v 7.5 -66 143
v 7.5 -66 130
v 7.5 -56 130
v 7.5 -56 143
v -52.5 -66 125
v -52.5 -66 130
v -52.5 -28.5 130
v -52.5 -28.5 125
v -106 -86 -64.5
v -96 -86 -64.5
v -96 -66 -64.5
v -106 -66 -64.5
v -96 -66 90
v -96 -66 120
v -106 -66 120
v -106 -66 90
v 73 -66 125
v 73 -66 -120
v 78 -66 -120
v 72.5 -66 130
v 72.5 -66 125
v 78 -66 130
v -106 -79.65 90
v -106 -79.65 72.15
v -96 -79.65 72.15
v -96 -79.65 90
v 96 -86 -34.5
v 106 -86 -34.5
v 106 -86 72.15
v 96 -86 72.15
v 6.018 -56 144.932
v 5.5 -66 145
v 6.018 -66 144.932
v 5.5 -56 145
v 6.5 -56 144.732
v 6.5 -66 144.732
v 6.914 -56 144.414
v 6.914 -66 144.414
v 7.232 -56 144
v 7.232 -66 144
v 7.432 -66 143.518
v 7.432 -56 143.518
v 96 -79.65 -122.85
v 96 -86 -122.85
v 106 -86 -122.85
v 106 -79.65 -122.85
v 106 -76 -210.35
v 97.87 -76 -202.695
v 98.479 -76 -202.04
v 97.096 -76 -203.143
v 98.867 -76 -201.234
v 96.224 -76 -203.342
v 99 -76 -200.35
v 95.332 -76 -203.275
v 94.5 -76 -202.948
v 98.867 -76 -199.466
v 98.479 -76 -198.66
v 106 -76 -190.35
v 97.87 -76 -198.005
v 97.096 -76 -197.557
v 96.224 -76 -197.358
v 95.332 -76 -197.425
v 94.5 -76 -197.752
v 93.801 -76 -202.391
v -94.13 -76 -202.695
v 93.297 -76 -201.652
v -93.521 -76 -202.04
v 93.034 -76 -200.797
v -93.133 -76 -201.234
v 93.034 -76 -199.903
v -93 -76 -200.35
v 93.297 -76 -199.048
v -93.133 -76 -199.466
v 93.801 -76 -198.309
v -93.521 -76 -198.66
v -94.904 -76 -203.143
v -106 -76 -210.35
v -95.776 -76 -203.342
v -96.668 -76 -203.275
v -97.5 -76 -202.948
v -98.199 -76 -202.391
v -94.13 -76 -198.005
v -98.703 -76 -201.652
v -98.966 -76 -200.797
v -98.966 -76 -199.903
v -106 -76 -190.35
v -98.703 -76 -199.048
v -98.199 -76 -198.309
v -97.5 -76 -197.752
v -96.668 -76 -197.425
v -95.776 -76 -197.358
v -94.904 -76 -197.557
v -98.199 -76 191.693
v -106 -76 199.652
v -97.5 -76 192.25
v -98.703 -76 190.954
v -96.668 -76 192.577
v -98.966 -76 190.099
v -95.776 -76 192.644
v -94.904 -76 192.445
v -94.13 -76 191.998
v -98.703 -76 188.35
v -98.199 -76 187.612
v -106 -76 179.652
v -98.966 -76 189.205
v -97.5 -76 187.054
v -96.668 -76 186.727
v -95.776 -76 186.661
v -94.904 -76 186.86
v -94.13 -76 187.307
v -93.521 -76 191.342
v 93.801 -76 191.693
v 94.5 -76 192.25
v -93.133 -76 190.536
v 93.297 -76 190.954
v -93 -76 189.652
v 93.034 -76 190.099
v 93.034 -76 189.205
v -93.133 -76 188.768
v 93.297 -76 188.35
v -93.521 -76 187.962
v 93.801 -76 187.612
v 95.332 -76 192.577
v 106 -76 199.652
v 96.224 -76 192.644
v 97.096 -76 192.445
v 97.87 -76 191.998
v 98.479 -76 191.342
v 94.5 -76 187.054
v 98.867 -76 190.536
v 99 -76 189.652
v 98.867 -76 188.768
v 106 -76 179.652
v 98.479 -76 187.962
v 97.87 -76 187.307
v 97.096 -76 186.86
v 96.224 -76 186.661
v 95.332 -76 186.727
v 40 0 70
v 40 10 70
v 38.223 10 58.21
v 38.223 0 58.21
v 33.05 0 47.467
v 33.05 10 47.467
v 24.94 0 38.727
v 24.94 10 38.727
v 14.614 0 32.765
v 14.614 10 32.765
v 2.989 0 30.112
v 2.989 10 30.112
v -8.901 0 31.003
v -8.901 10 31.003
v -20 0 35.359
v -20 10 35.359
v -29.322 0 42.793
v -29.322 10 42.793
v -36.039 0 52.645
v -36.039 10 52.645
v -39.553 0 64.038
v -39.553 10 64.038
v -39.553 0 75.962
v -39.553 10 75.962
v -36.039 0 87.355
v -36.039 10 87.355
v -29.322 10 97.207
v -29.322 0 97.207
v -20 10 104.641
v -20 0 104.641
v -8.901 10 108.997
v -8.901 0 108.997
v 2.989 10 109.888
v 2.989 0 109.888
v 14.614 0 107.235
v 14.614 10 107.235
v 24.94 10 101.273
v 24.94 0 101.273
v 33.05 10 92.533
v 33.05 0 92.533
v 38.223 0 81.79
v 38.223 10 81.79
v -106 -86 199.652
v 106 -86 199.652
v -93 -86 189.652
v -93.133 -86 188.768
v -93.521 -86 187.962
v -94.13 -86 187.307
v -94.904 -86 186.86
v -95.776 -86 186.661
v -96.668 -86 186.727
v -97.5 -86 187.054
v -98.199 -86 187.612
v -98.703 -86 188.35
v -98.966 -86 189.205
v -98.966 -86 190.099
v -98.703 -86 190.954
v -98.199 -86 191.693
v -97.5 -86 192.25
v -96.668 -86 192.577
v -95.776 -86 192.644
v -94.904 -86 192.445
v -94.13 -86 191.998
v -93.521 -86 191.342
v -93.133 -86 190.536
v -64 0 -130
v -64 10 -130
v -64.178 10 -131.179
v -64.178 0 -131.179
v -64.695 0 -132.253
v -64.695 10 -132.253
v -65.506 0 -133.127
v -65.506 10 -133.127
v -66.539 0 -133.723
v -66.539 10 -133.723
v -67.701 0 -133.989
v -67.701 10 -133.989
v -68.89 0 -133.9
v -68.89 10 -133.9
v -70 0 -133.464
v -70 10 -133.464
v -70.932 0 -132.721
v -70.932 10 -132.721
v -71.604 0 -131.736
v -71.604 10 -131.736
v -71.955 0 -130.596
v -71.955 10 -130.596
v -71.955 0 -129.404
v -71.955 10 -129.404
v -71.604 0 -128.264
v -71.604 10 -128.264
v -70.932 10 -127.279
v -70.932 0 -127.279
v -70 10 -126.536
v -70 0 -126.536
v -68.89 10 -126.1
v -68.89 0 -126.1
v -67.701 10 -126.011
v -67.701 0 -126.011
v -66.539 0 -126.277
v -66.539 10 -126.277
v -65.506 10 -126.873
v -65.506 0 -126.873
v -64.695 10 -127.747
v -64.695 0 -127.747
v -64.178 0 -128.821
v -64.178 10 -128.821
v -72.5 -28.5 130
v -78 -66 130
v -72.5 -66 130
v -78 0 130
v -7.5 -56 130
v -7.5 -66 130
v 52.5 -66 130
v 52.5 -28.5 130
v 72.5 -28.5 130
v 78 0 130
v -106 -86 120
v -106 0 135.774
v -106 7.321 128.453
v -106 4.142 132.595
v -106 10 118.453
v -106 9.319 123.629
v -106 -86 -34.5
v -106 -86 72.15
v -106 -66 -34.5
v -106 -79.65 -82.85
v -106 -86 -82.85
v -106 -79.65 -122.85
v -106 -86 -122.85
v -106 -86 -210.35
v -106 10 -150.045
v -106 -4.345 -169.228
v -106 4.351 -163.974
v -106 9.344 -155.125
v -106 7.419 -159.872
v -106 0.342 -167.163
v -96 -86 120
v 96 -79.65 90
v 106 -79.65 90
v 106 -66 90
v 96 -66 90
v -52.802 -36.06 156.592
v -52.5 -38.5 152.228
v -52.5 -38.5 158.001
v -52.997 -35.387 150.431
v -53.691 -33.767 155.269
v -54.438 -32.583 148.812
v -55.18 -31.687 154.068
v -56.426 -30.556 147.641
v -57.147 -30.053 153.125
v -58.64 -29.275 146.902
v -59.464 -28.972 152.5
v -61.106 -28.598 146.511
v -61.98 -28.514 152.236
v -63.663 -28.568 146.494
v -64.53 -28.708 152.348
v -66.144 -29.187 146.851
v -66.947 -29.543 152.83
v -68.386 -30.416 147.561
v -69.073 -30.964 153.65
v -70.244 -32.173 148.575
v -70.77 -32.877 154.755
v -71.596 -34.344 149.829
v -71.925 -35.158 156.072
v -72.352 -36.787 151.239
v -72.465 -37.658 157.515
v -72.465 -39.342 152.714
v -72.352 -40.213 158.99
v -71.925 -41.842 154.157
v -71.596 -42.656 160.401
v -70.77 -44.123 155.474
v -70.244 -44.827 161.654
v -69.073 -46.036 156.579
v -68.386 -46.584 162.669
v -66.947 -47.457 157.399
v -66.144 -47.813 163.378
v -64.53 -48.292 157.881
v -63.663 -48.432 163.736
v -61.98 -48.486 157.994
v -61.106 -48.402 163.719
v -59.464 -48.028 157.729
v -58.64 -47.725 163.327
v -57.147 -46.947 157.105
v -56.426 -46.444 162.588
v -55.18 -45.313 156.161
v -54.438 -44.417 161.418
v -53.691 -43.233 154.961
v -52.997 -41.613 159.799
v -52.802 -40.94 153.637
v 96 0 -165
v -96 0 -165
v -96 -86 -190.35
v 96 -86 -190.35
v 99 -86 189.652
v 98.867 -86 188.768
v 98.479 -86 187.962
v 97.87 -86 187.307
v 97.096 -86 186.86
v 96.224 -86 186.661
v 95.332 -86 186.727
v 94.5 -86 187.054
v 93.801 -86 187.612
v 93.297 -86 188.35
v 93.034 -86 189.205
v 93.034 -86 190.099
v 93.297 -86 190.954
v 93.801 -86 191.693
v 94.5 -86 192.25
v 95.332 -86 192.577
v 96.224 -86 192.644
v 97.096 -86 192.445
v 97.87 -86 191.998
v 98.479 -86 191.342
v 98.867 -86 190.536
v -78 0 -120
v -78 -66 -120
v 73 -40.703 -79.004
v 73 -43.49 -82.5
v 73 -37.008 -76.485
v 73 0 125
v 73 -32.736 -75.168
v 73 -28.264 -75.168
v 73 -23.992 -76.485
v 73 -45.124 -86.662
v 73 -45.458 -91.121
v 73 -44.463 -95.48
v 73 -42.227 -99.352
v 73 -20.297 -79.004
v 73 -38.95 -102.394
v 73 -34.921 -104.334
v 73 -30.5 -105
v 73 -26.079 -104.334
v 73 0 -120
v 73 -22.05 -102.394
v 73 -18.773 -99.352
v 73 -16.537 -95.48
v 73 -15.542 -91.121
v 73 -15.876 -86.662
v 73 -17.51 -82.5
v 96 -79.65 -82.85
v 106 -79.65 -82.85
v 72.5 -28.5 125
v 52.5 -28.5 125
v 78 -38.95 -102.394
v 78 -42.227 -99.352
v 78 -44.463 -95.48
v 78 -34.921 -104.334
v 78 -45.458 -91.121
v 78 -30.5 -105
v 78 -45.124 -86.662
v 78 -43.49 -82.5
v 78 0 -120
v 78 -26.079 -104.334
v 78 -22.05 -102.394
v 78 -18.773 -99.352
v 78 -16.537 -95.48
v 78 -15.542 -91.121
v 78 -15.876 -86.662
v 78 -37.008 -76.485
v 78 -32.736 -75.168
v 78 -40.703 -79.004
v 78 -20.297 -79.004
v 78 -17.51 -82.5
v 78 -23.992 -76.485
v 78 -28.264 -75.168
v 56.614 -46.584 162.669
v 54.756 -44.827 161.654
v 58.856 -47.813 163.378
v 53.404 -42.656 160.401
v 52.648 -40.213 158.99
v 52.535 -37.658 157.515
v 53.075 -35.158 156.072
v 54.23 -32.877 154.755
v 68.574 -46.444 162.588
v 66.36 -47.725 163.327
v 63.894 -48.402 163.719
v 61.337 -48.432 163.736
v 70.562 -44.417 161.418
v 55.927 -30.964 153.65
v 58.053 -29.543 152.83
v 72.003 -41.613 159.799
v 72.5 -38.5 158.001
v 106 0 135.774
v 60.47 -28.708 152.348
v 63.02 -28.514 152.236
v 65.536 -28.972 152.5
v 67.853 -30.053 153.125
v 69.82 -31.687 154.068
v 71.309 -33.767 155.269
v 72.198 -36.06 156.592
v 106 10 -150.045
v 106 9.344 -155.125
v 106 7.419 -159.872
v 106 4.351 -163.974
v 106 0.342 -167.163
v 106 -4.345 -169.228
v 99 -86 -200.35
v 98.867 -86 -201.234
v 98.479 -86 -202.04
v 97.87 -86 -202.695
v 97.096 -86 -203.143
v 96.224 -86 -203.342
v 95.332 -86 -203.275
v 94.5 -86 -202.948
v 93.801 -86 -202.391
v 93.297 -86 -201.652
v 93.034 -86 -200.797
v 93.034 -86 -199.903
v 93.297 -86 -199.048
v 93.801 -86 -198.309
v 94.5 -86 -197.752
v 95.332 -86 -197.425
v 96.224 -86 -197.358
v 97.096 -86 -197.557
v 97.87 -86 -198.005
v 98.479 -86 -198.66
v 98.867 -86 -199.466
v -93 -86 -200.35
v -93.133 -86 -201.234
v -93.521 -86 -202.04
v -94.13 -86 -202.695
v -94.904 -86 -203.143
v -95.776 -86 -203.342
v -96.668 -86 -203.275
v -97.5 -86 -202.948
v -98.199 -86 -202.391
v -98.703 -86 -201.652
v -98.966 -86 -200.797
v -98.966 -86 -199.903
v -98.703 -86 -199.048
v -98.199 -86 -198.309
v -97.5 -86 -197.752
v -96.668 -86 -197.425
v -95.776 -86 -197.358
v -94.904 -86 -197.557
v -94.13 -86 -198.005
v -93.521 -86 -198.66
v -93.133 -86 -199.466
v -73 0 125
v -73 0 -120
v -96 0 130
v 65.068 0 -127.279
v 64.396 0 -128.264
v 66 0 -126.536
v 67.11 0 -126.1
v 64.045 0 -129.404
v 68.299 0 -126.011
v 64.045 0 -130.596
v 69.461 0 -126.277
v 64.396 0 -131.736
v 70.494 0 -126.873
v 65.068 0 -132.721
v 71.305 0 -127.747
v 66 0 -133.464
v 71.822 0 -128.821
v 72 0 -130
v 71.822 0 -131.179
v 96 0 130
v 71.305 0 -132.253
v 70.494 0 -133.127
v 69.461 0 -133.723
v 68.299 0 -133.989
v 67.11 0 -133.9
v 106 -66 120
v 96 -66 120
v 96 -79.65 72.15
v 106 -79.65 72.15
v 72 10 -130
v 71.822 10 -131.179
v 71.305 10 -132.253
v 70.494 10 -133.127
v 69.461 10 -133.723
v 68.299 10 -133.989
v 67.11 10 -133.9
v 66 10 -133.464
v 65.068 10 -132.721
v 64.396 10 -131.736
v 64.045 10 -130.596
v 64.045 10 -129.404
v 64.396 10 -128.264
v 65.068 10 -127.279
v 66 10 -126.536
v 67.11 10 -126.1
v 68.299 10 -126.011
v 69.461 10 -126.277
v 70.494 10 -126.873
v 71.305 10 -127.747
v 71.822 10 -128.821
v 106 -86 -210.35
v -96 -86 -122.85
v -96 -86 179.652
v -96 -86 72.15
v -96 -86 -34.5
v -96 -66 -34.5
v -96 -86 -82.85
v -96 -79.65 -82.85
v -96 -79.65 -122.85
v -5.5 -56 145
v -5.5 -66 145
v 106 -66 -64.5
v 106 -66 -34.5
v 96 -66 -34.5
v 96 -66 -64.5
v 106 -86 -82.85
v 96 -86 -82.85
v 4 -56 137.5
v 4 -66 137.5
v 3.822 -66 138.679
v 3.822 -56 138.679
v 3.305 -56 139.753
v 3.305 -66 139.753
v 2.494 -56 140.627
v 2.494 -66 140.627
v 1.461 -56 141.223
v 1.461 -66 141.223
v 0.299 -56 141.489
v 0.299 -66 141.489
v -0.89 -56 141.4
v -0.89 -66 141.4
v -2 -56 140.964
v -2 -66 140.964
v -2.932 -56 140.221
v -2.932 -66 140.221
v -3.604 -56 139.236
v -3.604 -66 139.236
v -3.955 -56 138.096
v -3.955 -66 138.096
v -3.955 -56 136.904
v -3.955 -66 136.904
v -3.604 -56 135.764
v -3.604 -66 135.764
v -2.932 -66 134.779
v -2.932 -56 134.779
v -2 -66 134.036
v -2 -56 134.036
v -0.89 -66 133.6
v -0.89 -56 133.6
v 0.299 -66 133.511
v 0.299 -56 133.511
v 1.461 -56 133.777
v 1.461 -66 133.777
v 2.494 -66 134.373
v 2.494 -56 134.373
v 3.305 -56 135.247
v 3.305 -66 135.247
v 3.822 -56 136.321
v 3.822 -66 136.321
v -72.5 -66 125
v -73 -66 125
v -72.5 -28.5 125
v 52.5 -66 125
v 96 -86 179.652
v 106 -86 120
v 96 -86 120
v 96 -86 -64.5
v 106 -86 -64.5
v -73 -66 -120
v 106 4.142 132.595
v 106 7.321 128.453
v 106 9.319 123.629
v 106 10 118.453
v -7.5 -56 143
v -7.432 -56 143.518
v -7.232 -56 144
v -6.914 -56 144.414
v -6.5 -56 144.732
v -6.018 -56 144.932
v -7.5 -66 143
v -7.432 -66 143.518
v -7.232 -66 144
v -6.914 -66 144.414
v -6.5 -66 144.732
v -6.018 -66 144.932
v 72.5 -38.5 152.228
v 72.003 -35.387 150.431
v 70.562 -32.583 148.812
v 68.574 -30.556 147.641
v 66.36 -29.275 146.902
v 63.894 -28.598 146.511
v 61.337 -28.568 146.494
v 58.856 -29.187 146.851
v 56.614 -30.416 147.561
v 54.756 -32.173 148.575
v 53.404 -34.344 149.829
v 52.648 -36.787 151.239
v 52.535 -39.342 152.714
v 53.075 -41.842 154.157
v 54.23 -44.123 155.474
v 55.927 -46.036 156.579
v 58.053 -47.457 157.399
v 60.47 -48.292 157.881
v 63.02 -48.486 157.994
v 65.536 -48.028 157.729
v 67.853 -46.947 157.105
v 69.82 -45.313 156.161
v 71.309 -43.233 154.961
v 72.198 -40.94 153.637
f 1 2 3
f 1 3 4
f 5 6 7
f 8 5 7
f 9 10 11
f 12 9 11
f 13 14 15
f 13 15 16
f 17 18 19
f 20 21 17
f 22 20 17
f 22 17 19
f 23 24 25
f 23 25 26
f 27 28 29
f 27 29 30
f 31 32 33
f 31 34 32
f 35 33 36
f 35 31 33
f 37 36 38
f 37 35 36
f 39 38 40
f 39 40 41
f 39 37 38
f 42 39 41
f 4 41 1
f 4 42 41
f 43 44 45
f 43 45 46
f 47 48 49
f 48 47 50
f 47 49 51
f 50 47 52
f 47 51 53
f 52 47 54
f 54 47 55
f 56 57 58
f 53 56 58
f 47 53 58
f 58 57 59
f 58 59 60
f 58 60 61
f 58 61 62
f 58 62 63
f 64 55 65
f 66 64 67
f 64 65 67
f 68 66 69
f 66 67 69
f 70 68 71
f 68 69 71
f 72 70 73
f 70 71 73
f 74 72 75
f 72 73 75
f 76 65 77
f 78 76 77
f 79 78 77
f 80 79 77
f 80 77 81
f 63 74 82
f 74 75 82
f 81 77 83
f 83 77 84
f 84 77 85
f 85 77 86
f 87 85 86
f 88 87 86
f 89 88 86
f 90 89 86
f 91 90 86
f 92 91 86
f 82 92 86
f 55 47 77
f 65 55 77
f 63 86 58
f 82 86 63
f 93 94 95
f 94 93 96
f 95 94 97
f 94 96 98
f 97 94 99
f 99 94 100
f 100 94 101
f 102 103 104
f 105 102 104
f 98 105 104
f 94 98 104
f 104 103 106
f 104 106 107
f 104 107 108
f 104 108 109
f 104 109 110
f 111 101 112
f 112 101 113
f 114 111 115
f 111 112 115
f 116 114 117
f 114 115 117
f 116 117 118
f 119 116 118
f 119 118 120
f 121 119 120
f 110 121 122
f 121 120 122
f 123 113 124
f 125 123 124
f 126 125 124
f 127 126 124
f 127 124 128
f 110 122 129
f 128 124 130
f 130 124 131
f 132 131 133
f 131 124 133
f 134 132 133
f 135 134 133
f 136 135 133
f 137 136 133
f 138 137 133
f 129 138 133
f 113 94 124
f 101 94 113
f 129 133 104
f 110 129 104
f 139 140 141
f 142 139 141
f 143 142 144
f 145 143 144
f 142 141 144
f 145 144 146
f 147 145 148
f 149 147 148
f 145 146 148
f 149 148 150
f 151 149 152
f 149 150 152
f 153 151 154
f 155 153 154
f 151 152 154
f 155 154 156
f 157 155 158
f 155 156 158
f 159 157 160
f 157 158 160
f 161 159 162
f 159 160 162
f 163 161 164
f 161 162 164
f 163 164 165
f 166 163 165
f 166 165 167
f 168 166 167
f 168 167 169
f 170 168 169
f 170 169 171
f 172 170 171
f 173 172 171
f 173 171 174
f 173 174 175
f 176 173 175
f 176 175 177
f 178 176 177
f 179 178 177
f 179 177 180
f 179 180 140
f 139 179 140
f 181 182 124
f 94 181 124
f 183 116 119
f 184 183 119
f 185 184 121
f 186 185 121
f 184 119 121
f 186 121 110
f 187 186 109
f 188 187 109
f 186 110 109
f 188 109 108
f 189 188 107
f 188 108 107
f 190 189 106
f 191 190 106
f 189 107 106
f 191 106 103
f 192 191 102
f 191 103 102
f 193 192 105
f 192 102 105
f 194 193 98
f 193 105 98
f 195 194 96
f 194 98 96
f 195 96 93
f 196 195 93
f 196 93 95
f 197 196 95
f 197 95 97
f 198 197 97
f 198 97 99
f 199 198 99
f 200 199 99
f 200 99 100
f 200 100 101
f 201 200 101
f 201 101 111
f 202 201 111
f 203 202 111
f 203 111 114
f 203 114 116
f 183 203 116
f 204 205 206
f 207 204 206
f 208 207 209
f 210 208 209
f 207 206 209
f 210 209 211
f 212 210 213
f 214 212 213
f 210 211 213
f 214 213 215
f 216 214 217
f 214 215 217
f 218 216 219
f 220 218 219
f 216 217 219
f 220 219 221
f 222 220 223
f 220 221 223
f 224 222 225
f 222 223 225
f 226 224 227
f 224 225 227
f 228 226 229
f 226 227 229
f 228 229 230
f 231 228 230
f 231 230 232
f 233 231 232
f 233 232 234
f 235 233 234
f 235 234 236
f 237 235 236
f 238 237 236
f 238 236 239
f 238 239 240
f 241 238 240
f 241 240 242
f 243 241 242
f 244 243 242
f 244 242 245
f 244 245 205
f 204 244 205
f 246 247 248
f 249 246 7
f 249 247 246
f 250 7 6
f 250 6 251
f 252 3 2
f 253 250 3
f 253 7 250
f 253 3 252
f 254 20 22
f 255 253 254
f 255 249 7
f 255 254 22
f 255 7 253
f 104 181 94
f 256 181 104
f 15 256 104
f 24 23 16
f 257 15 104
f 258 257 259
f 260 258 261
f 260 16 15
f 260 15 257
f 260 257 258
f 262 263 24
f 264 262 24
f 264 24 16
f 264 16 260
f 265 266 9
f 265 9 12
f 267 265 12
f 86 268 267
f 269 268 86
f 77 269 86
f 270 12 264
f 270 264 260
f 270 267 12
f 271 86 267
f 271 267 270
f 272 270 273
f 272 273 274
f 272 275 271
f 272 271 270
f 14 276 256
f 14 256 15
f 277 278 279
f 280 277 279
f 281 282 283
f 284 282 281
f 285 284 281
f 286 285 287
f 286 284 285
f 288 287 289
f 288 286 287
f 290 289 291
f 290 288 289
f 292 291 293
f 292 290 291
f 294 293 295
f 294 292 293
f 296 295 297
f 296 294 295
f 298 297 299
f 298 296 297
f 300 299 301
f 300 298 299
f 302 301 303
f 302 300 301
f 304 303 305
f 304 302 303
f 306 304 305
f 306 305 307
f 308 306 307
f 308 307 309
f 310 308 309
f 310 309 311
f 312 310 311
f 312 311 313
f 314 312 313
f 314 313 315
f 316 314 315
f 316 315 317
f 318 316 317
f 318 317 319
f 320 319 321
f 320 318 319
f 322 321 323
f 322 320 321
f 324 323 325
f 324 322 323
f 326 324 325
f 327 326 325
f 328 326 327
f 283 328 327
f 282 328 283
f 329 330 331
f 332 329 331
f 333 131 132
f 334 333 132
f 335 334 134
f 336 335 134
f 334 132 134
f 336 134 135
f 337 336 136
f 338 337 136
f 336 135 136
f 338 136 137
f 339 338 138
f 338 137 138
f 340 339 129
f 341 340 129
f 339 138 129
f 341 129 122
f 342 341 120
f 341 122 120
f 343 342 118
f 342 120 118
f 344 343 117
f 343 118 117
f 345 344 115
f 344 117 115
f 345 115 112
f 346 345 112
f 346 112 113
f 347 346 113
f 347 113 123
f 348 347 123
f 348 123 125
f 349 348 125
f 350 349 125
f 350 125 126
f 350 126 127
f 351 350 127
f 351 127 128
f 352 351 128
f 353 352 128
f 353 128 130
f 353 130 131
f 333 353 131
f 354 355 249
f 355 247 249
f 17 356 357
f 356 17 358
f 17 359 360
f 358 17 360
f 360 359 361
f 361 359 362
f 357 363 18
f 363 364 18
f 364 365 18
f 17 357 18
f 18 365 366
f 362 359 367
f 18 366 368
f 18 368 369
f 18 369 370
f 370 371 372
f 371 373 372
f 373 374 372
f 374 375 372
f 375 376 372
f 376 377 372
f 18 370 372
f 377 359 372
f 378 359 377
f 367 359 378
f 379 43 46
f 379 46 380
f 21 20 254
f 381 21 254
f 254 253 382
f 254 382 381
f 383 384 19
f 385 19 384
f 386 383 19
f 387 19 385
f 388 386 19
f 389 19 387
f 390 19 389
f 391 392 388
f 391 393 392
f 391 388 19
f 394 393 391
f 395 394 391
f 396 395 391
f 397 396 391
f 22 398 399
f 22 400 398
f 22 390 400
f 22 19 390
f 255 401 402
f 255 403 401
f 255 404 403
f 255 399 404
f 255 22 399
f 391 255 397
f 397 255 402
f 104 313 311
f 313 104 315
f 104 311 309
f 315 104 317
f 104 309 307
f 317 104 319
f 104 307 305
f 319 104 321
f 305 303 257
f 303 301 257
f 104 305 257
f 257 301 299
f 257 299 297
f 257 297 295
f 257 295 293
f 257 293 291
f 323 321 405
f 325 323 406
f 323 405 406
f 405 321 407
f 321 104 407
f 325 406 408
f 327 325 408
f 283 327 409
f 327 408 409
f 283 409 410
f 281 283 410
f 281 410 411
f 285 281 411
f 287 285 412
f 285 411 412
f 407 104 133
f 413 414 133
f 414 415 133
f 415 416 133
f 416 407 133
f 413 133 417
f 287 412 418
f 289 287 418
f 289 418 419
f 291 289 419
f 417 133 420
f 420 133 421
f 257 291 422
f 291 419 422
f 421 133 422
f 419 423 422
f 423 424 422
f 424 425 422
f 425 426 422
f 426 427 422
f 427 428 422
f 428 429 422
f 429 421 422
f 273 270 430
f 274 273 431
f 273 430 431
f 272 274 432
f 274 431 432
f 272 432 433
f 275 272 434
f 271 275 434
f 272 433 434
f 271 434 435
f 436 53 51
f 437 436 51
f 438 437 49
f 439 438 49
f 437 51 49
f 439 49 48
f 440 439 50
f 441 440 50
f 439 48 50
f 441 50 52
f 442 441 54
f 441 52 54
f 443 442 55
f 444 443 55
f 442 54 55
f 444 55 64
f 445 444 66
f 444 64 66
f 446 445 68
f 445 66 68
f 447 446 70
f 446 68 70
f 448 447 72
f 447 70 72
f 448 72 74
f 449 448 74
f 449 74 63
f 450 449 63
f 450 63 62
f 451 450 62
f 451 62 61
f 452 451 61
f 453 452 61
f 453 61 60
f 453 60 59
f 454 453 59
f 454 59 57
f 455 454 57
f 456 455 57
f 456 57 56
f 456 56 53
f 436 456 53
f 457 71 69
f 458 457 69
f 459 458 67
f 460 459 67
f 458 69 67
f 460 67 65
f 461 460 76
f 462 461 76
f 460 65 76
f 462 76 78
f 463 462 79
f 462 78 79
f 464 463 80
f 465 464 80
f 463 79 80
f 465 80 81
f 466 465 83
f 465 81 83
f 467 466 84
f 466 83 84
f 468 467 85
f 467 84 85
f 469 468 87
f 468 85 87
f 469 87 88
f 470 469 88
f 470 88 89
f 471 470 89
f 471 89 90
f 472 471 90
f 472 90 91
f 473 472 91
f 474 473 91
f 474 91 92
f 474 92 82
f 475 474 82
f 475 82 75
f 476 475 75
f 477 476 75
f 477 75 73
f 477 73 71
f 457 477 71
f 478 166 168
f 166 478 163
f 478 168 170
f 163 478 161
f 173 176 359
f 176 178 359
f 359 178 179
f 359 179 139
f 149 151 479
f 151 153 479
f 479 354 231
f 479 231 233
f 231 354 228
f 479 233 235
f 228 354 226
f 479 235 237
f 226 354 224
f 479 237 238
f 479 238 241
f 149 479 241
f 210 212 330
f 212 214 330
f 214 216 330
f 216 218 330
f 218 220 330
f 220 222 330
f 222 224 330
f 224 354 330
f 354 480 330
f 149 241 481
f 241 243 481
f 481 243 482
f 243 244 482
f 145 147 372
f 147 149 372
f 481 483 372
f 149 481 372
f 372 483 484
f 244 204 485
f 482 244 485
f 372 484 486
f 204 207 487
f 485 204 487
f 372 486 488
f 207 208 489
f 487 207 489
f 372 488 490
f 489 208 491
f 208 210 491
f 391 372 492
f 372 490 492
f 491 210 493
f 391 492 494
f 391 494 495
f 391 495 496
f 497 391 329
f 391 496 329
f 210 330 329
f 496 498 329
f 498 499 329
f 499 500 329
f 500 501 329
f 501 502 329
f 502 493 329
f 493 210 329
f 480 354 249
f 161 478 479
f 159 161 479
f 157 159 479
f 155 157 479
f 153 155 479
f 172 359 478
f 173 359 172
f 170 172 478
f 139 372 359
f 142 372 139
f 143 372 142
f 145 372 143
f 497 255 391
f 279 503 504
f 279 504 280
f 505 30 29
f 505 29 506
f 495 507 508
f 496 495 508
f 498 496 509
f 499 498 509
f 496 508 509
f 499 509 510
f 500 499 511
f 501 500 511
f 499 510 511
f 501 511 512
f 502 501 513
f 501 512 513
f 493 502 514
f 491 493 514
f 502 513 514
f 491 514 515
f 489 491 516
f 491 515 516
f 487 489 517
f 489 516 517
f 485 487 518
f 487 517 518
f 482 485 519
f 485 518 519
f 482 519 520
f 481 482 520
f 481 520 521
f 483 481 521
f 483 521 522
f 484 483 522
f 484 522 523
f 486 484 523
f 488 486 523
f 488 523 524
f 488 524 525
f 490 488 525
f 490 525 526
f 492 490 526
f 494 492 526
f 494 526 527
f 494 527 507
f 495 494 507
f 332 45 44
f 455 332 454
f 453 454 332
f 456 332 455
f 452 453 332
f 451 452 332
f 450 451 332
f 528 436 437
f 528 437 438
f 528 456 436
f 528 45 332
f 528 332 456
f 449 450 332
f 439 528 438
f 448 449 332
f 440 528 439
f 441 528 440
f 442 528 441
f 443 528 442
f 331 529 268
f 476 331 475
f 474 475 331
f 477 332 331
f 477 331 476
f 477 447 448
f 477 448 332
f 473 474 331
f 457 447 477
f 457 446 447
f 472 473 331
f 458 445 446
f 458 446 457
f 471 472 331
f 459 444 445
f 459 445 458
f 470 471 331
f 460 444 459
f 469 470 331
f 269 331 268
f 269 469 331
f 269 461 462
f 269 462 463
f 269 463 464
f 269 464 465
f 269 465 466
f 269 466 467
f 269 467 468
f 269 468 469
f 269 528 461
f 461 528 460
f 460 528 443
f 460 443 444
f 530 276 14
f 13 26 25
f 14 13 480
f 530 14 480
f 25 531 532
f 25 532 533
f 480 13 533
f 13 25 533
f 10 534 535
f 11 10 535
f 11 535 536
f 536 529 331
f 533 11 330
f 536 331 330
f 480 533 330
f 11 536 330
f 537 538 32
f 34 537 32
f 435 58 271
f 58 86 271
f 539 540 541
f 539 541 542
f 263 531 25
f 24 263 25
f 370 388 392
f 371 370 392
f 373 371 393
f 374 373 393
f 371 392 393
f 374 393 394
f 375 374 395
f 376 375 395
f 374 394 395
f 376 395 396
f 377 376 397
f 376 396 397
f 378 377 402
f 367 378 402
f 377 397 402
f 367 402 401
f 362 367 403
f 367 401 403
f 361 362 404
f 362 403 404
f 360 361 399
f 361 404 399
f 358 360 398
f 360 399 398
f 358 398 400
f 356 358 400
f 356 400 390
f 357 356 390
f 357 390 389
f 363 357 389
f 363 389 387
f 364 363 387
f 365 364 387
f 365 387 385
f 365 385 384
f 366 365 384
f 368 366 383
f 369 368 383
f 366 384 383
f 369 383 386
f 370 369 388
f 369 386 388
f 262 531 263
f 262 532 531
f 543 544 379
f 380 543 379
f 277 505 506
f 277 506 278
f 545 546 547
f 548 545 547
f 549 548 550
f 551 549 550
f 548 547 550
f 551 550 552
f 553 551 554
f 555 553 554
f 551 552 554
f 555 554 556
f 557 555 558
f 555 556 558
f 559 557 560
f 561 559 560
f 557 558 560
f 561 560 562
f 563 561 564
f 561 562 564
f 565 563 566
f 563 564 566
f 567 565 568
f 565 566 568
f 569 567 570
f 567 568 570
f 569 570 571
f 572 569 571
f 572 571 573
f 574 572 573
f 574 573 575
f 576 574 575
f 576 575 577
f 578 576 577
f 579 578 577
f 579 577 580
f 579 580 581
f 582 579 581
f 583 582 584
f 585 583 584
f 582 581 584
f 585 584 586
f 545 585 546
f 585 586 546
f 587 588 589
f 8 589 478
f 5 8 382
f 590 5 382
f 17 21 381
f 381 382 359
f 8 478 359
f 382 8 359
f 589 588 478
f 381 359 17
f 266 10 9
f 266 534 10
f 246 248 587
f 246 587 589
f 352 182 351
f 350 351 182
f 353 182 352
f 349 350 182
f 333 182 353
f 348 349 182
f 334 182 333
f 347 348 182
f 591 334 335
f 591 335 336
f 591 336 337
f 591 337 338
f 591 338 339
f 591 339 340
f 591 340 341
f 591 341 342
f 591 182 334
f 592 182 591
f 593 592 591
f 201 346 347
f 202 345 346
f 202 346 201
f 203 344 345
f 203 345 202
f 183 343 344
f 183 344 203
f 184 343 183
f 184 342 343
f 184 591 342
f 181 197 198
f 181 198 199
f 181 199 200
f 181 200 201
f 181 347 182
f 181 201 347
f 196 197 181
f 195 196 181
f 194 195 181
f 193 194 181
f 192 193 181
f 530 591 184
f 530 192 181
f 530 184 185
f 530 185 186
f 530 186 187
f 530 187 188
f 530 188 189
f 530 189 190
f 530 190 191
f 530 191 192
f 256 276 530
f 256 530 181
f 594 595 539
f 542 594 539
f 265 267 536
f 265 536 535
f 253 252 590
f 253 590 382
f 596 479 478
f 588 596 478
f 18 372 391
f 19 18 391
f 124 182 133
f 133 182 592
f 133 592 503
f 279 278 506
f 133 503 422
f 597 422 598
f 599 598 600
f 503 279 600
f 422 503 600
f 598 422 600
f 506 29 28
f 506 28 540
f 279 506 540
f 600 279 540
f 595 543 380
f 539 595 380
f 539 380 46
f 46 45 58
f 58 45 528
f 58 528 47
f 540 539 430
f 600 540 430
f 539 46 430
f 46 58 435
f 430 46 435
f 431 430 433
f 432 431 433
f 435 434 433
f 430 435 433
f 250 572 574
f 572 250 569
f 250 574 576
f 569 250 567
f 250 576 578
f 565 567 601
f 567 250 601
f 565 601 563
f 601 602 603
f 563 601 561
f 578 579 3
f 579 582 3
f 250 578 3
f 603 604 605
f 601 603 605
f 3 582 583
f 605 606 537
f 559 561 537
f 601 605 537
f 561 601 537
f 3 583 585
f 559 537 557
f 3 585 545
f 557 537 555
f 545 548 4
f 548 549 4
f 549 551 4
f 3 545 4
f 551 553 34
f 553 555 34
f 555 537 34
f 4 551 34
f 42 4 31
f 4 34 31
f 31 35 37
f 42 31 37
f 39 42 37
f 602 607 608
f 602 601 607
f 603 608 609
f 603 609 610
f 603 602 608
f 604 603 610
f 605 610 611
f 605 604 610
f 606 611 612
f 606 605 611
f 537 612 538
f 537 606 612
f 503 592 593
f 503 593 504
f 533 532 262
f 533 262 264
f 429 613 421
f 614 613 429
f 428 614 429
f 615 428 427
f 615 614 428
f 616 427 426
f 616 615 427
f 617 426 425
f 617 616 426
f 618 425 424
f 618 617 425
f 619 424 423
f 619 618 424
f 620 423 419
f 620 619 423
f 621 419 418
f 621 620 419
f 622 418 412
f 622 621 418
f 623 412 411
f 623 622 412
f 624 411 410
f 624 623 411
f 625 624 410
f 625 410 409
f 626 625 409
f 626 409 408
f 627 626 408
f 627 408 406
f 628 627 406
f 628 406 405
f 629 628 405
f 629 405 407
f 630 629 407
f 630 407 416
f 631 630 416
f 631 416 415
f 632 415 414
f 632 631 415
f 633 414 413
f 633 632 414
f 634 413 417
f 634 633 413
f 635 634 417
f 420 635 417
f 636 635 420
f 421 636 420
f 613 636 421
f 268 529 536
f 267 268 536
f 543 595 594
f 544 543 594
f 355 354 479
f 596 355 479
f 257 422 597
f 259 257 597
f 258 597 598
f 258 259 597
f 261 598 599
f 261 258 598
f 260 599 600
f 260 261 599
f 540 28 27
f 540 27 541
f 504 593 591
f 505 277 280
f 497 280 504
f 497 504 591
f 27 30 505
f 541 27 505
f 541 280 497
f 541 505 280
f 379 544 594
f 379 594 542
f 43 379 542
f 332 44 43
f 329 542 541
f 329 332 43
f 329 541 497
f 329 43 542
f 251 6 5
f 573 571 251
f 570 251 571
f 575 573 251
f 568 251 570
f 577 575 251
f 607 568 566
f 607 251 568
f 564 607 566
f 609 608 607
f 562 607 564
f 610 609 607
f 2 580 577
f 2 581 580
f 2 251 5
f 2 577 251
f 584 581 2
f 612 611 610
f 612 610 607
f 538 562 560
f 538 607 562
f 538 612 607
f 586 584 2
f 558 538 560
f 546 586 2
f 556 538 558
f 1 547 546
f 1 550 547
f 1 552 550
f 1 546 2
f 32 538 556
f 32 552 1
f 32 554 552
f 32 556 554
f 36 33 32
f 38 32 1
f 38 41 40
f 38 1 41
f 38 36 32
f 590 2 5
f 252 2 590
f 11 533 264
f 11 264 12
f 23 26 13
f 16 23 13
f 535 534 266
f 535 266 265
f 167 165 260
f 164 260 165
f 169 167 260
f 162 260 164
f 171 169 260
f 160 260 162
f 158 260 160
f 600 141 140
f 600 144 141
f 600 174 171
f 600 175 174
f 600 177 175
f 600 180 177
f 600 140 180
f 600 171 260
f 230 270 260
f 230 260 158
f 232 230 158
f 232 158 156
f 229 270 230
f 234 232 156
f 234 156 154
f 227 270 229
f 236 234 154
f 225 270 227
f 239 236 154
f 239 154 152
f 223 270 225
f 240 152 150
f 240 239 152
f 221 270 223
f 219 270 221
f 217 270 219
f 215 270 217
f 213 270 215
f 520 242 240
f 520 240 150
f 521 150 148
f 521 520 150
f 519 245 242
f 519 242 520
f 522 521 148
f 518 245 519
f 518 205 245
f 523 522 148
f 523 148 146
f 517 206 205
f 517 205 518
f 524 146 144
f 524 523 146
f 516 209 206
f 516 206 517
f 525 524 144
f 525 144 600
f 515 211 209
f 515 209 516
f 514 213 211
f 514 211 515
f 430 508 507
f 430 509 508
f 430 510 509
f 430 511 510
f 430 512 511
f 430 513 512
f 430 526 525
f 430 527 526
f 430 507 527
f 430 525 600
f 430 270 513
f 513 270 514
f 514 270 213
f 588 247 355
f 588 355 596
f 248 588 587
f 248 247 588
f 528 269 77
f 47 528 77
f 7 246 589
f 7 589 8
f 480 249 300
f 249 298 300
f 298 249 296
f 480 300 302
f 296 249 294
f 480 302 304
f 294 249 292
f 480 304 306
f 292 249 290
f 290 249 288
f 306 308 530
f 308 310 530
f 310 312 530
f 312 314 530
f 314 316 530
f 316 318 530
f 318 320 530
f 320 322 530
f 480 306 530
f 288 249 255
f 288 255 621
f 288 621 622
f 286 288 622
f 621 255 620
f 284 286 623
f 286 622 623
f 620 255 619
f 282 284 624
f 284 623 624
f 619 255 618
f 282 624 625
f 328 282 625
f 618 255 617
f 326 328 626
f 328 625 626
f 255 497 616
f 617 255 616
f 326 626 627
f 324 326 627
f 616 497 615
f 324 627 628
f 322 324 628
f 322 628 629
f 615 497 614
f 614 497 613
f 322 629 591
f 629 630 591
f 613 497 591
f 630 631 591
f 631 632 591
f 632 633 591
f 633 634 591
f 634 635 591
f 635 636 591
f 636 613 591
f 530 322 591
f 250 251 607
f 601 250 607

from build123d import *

# Parameters (mm, degrees)
SKETCH1_W                        = 156
SKETCH1_H                        = 260
BOSS_EXTRUDE1_DEPTH              = 10
BOSS_EXTRUDE2_DEPTH              = 66
SKETCH3_R                        = 40
CUT_EXTRUDE1_DEPTH               = 77
SKETCH4_W                        = 20
SKETCH4_H                        = 37.5
CUT_EXTRUDE2_DEPTH               = 5
SKETCH6_W                        = 15
SKETCH6_H                        = 15
BOSS_EXTRUDE3_DEPTH              = 10
SKETCH7_R                        = 4
CUT_EXTRUDE4_DEPTH               = 10
FILLET1_R                        = 2
SKETCH8_W                        = 156
SKETCH8_H                        = 10
BOSS_EXTRUDE4_DEPTH              = 10
SKETCH9_R                        = 4
CUT_EXTRUDE5_DEPTH               = 77
SKETCH10_W                       = 156
SKETCH10_H                       = 10
BOSS_EXTRUDE5_DEPTH              = 25
SKETCH11_W                       = 28
SKETCH11_H                       = 295
BOSS_EXTRUDE6_DEPTH              = 10
BOSS_EXTRUDE7_DEPTH              = 212
SKETCH13_R                       = 3
CUT_EXTRUDE6_DEPTH               = 11
BOSS_EXTRUDE10_DEPTH             = 212
SKETCH18_R                       = 3
CUT_EXTRUDE8_DEPTH               = 11
SKETCH19_R                       = 10
CUT_EXTRUDE9_DEPTH               = 113
BOSS_EXTRUDE11_REACH             = 47.35
SKETCH20_W                       = 10
SKETCH20_H                       = 86
BOSS_EXTRUDE11_DIRECTION_2_REACH = 366.652
FILLET2_R                        = 20
SKETCH21_R                       = 15
CUT_EXTRUDE11_DEPTH              = 5
SKETCH22_W                       = 30
SKETCH22_H                       = 20
CUT_EXTRUDE12_DEPTH              = 1
CUT_EXTRUDE12_DEPTH_BACK         = 213
SKETCH23_W                       = 40
SKETCH23_H                       = 6.35
CUT_EXTRUDE13_DEPTH              = 1
CUT_EXTRUDE13_DEPTH_BACK         = 213


with BuildPart() as part:
    # Sketch1 → Boss-Extrude1 (new body)
    with BuildSketch(Plane(origin=(0, 0, 0), x_dir=(1, 0, 0), z_dir=(0, 1, 0))):
        Rectangle(SKETCH1_W, SKETCH1_H)
    extrude(amount=BOSS_EXTRUDE1_DEPTH)

    # Sketch2 → Boss-Extrude2 (add)
    with BuildSketch(Plane.XZ):
        Polygon((-73, -120), (-73, 125), (73, 125), (73, -120), (78, -120), (78, 130), (-78, 130), (-78, -120), align=None)
    extrude(amount=BOSS_EXTRUDE2_DEPTH)

    # Sketch3 → Cut-Extrude1 (cut, through all)
    with BuildSketch(Plane(origin=(0, 10, 0), x_dir=(1, 0, 0), z_dir=(0, 1, 0))):
        with Locations((0, -70)):
            Circle(SKETCH3_R)
    extrude(amount=-CUT_EXTRUDE1_DEPTH, mode=Mode.SUBTRACT)

    # Sketch4 → Cut-Extrude2 (cut)
    with BuildSketch(Plane.XY.offset(130)):
        with Locations((-62.5, -47.25)):
            Rectangle(SKETCH4_W, SKETCH4_H)
        with Locations((62.5, -47.25)):
            Rectangle(SKETCH4_W, SKETCH4_H)
    extrude(amount=-CUT_EXTRUDE2_DEPTH, mode=Mode.SUBTRACT)

    # Sketch6 → Boss-Extrude3 (add)
    with BuildSketch(Plane.XZ.offset(66)):
        with Locations((0, 137.5)):
            Rectangle(SKETCH6_W, SKETCH6_H)
    extrude(amount=-BOSS_EXTRUDE3_DEPTH)

    # Sketch7 → Cut-Extrude4 (cut)
    with BuildSketch(Plane.XZ.offset(66)):
        with Locations((0, 137.5)):
            Circle(SKETCH7_R)
    extrude(amount=-CUT_EXTRUDE4_DEPTH, mode=Mode.SUBTRACT)

    # Fillet1
    fillet1_edges = [part.edges().sort_by_distance(p)[0] for p in [
        (7.5, -61, 145),
        (-7.5, -61, 145),
    ]]
    fillet(fillet1_edges, radius=FILLET1_R)

    # Sketch8 → Boss-Extrude4 (add)
    with BuildSketch(Plane(origin=(0, 0, -130), x_dir=(-1, 0, 0), z_dir=(0, 0, -1))):
        with Locations((0, 5)):
            Rectangle(SKETCH8_W, SKETCH8_H)
    extrude(amount=BOSS_EXTRUDE4_DEPTH)

    # Sketch9 → Cut-Extrude5 (cut, through all)
    with BuildSketch(Plane(origin=(0, 10, 0), x_dir=(1, 0, 0), z_dir=(0, 1, 0))):
        with Locations((-68, 130)):
            Circle(SKETCH9_R)
        with Locations((68, 130)):
            Circle(SKETCH9_R)
    extrude(amount=-CUT_EXTRUDE5_DEPTH, mode=Mode.SUBTRACT)

    # Sketch10 → Boss-Extrude5 (add)
    with BuildSketch(Plane(origin=(0, 0, -140), x_dir=(-1, 0, 0), z_dir=(0, 0, -1))):
        with Locations((0, 5)):
            Rectangle(SKETCH10_W, SKETCH10_H)
    extrude(amount=BOSS_EXTRUDE5_DEPTH)

    # Sketch11 → Boss-Extrude6 (add)
    with BuildSketch(Plane(origin=(0, 10, 0), x_dir=(1, 0, 0), z_dir=(0, 1, 0))):
        with Locations((-92, 17.5)):
            Rectangle(SKETCH11_W, SKETCH11_H)
        with Locations((92, 17.5)):
            Rectangle(SKETCH11_W, SKETCH11_H)
    extrude(amount=-BOSS_EXTRUDE6_DEPTH)

    # Sketch12 → Boss-Extrude7 (add)
    with BuildSketch(Plane.ZY.offset(106)):
        Polygon((-165, 0), (-190.349999035, -86), (-210.349999035, -86), (-210.349999035, -76), (-190.349999035, -76), (-165, 10), align=None)
    extrude(amount=-BOSS_EXTRUDE7_DEPTH)

    # Sketch13 → Cut-Extrude6 (cut, through all)
    with BuildSketch(Plane(origin=(0, -76, 0), x_dir=(1, 0, 0), z_dir=(0, 1, 0))):
        with Locations((-96, 200.349999035)):
            Circle(SKETCH13_R)
        with Locations((96, 200.349999035)):
            Circle(SKETCH13_R)
    extrude(amount=-CUT_EXTRUDE6_DEPTH, mode=Mode.SUBTRACT)

    # Sketch17 → Boss-Extrude10 (add)
    with BuildSketch(Plane(origin=(106, 0, 0), x_dir=(0, 0, -1), z_dir=(1, 0, 0))):
        Polygon((-130, 0), (-179.65212315, -86), (-199.65212315, -86), (-199.65212315, -76), (-179.65212315, -76), (-130, 10), align=None)
    extrude(amount=-BOSS_EXTRUDE10_DEPTH)

    # Sketch18 → Cut-Extrude8 (cut, through all)
    with BuildSketch(Plane(origin=(0, -76, 0), x_dir=(1, 0, 0), z_dir=(0, 1, 0))):
        with Locations((-96, -189.65212315)):
            Circle(SKETCH18_R)
        with Locations((96, -189.65212315)):
            Circle(SKETCH18_R)
    extrude(amount=-CUT_EXTRUDE8_DEPTH, mode=Mode.SUBTRACT)

    # Sketch19 → Cut-Extrude9 (cut)
    with BuildSketch(Plane.XY.offset(130)):
        with Locations((-62.5, -38.5)):
            Circle(SKETCH19_R)
        with Locations((62.5, -38.5)):
            Circle(SKETCH19_R)
    extrude(amount=CUT_EXTRUDE9_DEPTH, mode=Mode.SUBTRACT)

    # Boss-Extrude11: up to this face of the body (flat: up to its plane)
    boss_extrude11_end = Plane(part.part.faces().sort_by_distance((0, -33, -177.674999518))[0])
    # Sketch20 → Boss-Extrude11 (add, up to the picked face)
    with BuildSketch(Plane(origin=(0, 0, -165), x_dir=(-1, 0, 0), z_dir=(0, 0, -1)), mode=Mode.PRIVATE) as boss_extrude11_sk1:
        with Locations((-101, -43)):
            Rectangle(SKETCH20_W, SKETCH20_H)
    boss_extrude11_tool1 = split(extrude(boss_extrude11_sk1.sketch, amount=BOSS_EXTRUDE11_REACH, mode=Mode.PRIVATE), bisect_by=boss_extrude11_end, keep=Keep.BOTH, mode=Mode.PRIVATE)
    add(boss_extrude11_tool1.solids().sort_by_distance((101, -43, -165))[0])
    # Sketch20 → Boss-Extrude11 (add, up to the picked face)
    with BuildSketch(Plane(origin=(0, 0, -165), x_dir=(-1, 0, 0), z_dir=(0, 0, -1)), mode=Mode.PRIVATE) as boss_extrude11_sk2:
        with Locations((101, -43)):
            Rectangle(SKETCH20_W, SKETCH20_H)
    boss_extrude11_tool2 = split(extrude(boss_extrude11_sk2.sketch, amount=BOSS_EXTRUDE11_REACH, mode=Mode.PRIVATE), bisect_by=boss_extrude11_end, keep=Keep.BOTH, mode=Mode.PRIVATE)
    add(boss_extrude11_tool2.solids().sort_by_distance((-101, -43, -165))[0])

    # Sketch20 → Boss-Extrude11 direction 2 (add, up to next)
    with BuildSketch(Plane(origin=(0, 0, -165), x_dir=(-1, 0, 0), z_dir=(0, 0, -1)), mode=Mode.PRIVATE) as boss_extrude11_direction_2_sk1:
        with Locations((-101, -43)):
            Rectangle(SKETCH20_W, SKETCH20_H)
    boss_extrude11_direction_2_tool1 = extrude(boss_extrude11_direction_2_sk1.sketch, amount=-BOSS_EXTRUDE11_DIRECTION_2_REACH, mode=Mode.PRIVATE) - part.part
    add(boss_extrude11_direction_2_tool1.solids().sort_by_distance((101, -43, -165))[0])
    # Sketch20 → Boss-Extrude11 direction 2 (add, up to next)
    with BuildSketch(Plane(origin=(0, 0, -165), x_dir=(-1, 0, 0), z_dir=(0, 0, -1)), mode=Mode.PRIVATE) as boss_extrude11_direction_2_sk2:
        with Locations((101, -43)):
            Rectangle(SKETCH20_W, SKETCH20_H)
    boss_extrude11_direction_2_tool2 = extrude(boss_extrude11_direction_2_sk2.sketch, amount=-BOSS_EXTRUDE11_DIRECTION_2_REACH, mode=Mode.PRIVATE) - part.part
    add(boss_extrude11_direction_2_tool2.solids().sort_by_distance((-101, -43, -165))[0])

    # Fillet2
    fillet2_edges = [part.edges().sort_by_distance(p)[0] for p in [
        (0, 10, -165),
        (0, 10, 130),
    ]]
    fillet(fillet2_edges, radius=FILLET2_R)

    # Sketch21 → Cut-Extrude11 (cut)
    with BuildSketch(Plane(origin=(78, 0, 0), x_dir=(0, 0, -1), z_dir=(1, 0, 0))):
        with Locations((90, -30.5)):
            Circle(SKETCH21_R)
    extrude(amount=-CUT_EXTRUDE11_DEPTH, mode=Mode.SUBTRACT)

    # Sketch22 → Cut-Extrude12 (cut, two sides)
    with BuildSketch(Plane(origin=(106, 0, 0), x_dir=(0, 0, -1), z_dir=(1, 0, 0))) as cut_extrude12_sk:
        with Locations((-105, -76)):
            Rectangle(SKETCH22_W, SKETCH22_H)
        with Locations((49.5, -76)):
            Rectangle(SKETCH22_W, SKETCH22_H)
    extrude(amount=CUT_EXTRUDE12_DEPTH, mode=Mode.SUBTRACT)
    extrude(cut_extrude12_sk.sketch, amount=-CUT_EXTRUDE12_DEPTH_BACK, mode=Mode.SUBTRACT)

    # Sketch23 → Cut-Extrude13 (cut, two sides)
    with BuildSketch(Plane.ZY.offset(106)) as cut_extrude13_sk:
        with Locations((-102.849999035, -82.825)):
            Rectangle(SKETCH23_W, SKETCH23_H)
        with Locations((92.150000965, -82.825)):
            Rectangle(SKETCH23_W, SKETCH23_H)
    extrude(amount=CUT_EXTRUDE13_DEPTH, mode=Mode.SUBTRACT)
    extrude(cut_extrude13_sk.sketch, amount=-CUT_EXTRUDE13_DEPTH_BACK, mode=Mode.SUBTRACT)


solid = part.part
